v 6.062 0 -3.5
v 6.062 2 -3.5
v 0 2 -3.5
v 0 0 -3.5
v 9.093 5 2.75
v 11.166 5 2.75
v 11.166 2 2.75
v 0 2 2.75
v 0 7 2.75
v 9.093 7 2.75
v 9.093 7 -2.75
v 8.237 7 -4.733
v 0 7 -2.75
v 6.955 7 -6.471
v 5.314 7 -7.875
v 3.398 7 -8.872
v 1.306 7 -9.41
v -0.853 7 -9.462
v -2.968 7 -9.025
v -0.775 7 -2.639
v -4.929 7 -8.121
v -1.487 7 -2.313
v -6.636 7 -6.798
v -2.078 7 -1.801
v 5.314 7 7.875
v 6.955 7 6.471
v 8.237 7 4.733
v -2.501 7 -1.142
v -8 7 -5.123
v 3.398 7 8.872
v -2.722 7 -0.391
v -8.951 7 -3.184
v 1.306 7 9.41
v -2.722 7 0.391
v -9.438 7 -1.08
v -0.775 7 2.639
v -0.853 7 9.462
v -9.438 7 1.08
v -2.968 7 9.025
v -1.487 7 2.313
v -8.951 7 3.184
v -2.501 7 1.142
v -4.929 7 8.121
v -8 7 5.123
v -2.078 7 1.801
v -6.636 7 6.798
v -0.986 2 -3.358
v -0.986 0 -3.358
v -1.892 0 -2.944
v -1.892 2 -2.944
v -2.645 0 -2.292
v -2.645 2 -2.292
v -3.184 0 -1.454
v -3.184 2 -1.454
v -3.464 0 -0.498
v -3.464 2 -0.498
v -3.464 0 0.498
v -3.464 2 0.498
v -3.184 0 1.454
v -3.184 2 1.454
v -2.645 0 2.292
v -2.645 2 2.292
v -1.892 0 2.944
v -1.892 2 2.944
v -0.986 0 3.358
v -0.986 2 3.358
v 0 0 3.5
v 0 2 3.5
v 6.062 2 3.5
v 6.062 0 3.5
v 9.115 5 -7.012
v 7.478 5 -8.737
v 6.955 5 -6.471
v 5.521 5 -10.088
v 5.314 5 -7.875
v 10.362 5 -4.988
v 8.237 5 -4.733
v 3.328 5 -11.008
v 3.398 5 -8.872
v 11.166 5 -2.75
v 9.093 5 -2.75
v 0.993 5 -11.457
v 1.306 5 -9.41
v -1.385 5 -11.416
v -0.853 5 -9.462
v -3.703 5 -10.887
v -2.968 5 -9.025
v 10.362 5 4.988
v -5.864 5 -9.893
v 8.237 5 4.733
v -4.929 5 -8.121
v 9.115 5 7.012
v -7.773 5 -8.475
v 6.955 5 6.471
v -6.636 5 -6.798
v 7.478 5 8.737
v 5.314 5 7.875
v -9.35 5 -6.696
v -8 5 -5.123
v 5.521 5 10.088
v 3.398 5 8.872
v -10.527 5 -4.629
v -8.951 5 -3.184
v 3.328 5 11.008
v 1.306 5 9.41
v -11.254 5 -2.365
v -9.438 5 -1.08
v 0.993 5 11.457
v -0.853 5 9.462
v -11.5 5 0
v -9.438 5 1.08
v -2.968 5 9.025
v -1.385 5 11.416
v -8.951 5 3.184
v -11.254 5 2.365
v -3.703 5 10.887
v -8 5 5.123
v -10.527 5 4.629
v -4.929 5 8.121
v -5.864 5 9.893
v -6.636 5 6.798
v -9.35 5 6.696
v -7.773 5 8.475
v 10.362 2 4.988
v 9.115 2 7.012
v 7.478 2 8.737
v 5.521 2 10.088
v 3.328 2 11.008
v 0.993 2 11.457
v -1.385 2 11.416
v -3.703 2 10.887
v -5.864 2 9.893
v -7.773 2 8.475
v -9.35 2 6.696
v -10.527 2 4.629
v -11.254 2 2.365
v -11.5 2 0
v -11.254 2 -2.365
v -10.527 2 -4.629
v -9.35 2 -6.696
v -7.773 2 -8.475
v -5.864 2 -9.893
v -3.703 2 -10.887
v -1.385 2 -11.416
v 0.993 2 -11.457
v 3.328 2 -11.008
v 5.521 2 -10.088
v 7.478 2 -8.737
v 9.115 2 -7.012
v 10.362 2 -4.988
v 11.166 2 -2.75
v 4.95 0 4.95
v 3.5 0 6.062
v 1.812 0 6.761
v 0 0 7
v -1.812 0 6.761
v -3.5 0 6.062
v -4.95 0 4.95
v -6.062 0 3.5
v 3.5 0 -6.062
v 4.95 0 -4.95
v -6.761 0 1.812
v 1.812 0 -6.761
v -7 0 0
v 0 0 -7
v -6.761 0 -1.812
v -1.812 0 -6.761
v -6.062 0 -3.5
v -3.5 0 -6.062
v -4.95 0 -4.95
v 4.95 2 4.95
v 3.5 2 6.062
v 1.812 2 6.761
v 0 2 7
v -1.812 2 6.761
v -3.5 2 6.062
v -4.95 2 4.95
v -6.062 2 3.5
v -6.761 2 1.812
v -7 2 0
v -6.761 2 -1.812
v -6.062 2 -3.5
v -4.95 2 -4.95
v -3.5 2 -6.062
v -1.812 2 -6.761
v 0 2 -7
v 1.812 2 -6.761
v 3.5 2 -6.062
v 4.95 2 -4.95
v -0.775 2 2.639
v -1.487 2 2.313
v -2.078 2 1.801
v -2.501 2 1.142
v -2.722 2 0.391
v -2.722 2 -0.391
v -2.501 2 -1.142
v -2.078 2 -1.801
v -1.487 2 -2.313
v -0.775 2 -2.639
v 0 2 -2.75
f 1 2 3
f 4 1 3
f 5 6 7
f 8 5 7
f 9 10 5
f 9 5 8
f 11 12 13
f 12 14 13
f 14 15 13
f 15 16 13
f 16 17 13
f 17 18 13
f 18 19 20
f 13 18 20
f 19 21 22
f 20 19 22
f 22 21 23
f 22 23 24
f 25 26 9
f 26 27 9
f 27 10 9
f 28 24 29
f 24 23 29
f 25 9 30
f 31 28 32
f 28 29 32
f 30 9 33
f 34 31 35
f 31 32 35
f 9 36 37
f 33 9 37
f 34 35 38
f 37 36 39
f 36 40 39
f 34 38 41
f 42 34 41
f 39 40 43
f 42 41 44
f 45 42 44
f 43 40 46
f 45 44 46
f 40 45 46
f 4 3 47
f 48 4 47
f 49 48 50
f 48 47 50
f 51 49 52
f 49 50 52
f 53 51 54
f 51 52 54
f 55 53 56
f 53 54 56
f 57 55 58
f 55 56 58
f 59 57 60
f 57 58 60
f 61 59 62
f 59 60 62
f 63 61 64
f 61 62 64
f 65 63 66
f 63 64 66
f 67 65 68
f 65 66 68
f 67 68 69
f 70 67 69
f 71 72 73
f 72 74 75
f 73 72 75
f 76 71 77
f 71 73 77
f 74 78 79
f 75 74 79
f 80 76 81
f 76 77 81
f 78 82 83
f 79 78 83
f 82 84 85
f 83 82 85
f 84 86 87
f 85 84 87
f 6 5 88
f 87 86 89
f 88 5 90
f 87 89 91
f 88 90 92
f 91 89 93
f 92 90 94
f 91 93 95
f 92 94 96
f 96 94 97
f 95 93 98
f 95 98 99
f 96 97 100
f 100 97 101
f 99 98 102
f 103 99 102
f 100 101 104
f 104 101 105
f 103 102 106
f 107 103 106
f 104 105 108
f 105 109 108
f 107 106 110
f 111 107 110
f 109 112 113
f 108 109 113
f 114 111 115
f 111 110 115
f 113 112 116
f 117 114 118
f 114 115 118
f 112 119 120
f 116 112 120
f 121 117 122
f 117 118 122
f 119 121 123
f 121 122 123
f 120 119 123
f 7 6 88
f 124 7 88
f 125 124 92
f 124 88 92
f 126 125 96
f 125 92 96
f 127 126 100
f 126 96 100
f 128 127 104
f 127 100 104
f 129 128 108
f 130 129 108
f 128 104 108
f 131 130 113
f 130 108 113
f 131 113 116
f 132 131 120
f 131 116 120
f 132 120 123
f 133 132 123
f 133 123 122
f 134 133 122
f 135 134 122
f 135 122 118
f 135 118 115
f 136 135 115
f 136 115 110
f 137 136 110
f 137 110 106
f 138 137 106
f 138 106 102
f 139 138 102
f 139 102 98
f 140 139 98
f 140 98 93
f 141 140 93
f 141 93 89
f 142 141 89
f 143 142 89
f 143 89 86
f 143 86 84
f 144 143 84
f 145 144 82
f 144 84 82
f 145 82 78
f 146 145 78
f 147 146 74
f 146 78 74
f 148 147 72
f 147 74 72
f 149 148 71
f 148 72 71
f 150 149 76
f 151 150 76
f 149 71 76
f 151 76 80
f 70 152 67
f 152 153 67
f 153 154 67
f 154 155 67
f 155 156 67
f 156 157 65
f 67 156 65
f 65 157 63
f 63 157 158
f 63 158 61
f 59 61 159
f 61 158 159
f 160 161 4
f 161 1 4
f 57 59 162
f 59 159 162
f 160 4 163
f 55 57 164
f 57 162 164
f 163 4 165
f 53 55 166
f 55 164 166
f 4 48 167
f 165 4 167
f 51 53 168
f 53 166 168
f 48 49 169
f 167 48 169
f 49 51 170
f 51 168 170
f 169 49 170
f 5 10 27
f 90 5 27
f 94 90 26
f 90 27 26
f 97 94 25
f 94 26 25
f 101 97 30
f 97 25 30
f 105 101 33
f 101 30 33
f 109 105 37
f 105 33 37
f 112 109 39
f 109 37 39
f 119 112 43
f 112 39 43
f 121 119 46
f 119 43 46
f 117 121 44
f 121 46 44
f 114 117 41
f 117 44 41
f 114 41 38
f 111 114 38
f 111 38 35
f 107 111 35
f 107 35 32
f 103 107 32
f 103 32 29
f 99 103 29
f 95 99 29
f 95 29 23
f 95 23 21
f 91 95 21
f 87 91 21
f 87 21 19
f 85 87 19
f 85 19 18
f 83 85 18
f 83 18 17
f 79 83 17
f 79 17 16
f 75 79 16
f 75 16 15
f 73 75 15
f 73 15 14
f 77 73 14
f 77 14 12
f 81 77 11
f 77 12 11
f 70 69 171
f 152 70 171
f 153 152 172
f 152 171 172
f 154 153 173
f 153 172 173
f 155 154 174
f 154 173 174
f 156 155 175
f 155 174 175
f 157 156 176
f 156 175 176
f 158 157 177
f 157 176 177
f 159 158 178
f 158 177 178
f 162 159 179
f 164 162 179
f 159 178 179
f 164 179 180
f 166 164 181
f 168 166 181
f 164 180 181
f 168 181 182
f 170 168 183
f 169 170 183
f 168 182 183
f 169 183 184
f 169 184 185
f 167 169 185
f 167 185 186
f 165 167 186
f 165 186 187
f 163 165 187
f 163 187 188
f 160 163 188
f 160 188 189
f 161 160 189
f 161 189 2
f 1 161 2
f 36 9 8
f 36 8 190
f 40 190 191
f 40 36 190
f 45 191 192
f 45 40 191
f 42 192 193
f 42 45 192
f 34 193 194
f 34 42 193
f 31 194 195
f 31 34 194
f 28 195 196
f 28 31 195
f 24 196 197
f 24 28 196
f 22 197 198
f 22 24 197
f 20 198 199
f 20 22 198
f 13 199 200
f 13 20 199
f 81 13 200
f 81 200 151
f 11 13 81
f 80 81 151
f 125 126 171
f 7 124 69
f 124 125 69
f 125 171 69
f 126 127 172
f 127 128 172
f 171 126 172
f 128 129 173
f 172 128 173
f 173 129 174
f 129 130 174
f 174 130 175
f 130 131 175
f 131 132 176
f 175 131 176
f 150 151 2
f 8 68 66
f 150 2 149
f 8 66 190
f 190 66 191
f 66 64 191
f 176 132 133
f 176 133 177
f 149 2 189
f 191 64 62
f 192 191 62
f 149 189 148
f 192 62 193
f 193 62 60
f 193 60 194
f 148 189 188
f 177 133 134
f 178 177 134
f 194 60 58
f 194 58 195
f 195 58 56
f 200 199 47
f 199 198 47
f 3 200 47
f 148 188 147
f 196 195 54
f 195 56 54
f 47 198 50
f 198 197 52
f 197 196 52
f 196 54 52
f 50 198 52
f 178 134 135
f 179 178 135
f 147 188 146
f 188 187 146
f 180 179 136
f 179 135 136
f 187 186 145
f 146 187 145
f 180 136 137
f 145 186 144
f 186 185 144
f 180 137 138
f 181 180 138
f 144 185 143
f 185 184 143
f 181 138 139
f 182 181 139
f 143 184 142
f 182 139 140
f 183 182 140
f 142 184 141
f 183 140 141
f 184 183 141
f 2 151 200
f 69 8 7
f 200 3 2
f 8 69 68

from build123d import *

# Parameters (mm, degrees)
CUT_EXTRUDE1_START = -2
CUT_EXTRUDE1_DEPTH = 2
CUT_EXTRUDE2_DEPTH = 11


with BuildPart() as part:
    # Sketch1 → Revolve1 (revolve)
    with BuildSketch(Plane.XY, mode=Mode.PRIVATE) as revolve1_sk:
        Polygon((0, 0), (7, 0), (7, 2), (11.5, 2), (11.5, 5), (9.5, 5), (9.5, 7), (0, 7), align=None)
    revolve(revolve1_sk.sketch.rotate(Axis((0, 7, 0), (0, -1, 0)), 90), axis=Axis((0, 7, 0), (0, -1, 0)))

    # Sketch3 → Cut-Extrude1 (cut)
    with BuildSketch(Plane.XZ.offset(CUT_EXTRUDE1_START)):
        with BuildLine():
            Line((0, 3.5), (6.062177826, 3.5))
            ThreePointArc((6.062177826, 3.5), (7, 0), (6.062177826, -3.5))
            Line((6.062177826, -3.5), (0, -3.5))
            ThreePointArc((0, -3.5), (-3.5, 0), (0, 3.5))
        make_face()
    extrude(amount=CUT_EXTRUDE1_DEPTH, mode=Mode.SUBTRACT)

    # Sketch4 → Cut-Extrude2 (cut)
    with BuildSketch(Plane(origin=(0, 7, 0), x_dir=(1, 0, 0), z_dir=(0, 1, 0))):
        with BuildLine():
            Line((0, 2.75), (11.166355717, 2.75))
            ThreePointArc((11.166355717, 2.75), (11.5, 0), (11.166355717, -2.75))
            Line((11.166355717, -2.75), (0, -2.75))
            ThreePointArc((0, -2.75), (-2.75, 0), (0, 2.75))
        make_face()
    extrude(amount=-CUT_EXTRUDE2_DEPTH, mode=Mode.SUBTRACT)


solid = part.part
